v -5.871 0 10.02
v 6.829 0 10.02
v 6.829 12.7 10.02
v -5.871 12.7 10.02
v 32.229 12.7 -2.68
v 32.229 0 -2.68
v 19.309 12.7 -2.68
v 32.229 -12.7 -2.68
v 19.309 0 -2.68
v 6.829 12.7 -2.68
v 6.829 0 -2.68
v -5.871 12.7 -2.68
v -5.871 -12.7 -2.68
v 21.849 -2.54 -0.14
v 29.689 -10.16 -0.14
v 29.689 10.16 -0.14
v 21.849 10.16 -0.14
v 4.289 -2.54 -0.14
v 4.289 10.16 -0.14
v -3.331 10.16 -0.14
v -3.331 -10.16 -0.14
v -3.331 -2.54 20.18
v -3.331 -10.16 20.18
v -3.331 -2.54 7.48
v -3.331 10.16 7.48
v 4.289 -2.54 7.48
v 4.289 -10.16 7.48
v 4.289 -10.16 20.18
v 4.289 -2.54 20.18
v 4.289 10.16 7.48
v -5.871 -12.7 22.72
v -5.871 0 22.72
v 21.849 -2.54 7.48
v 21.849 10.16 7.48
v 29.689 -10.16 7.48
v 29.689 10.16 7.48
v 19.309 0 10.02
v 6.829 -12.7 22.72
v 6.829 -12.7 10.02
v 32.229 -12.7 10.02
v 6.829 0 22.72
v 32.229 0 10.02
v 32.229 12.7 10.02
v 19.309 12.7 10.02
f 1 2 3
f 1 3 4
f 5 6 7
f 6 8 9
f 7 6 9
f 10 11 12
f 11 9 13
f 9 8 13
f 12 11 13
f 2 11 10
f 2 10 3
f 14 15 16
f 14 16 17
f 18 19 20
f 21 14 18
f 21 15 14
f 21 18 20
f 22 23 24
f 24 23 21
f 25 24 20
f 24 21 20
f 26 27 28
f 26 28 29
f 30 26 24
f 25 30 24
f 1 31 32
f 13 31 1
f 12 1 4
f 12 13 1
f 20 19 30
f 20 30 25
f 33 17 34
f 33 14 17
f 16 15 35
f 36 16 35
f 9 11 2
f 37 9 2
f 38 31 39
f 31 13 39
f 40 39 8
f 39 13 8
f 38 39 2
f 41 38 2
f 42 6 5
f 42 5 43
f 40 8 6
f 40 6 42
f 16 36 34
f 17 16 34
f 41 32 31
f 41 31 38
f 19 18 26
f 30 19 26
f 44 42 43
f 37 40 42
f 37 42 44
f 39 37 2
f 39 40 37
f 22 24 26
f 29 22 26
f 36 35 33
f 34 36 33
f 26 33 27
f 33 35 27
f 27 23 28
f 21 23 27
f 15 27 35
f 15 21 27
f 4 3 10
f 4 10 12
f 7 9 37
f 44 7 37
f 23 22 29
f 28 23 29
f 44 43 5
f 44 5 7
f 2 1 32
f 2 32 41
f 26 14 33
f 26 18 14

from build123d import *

# Parameters (mm, degrees)
F0_W     = 12.7
F0_H     = 12.7
F1_DEPTH = 12.7
F2_DEPTH = 25.4
F3_W     = 12.9194361269
F3_H     = 12.7
F4_DEPTH = 12.7
F5_W     = 12.7
F5_H     = 12.7
F6_DEPTH = 12.7
F7_W     = 12.7
F7_H     = 12.7
F8_DEPTH = 12.7
F9_T     = -2.54


with BuildPart() as f1:
    # F0 (on Front) → F1 (new body)
    with BuildSketch(Plane.XZ):
        with Locations((0.4788246006, 3.6696097578)):
            Rectangle(F0_W, F0_H)
    extrude(amount=F1_DEPTH)

    # F2 (add): a face of the model
    f2_faces = [f1.faces().sort_by_distance(p)[0] for p in [
        (6.8288246006, -6.35, 3.6696097578),
    ]]
    extrude(f2_faces, amount=F2_DEPTH)

    # F3 (on face) → F4 (join)
    with BuildSketch(Plane(origin=(0, 0, 0), x_dir=(-1, 0, 0), z_dir=(0, 1, 0))):
        with Locations((-25.7691065371, 3.6696097578)):
            Rectangle(F3_W, F3_H)
    extrude(amount=F4_DEPTH)

    # F5 (on face) → F6 (join)
    with BuildSketch(Plane(origin=(0, 0, 0), x_dir=(-1, 0, 0), z_dir=(0, 1, 0))):
        with Locations((-0.4788246006, 3.6696097578)):
            Rectangle(F5_W, F5_H)
    extrude(amount=F6_DEPTH)

    # F7 (on face) → F8 (join)
    with BuildSketch(Plane.XY.offset(10.0196097578)):
        with Locations((0.4788246006, -6.35)):
            Rectangle(F7_W, F7_H)
    extrude(amount=F8_DEPTH)

    # F9 (hollow: no face is removed)
    offset(amount=F9_T, kind=Kind.INTERSECTION, mode=Mode.SUBTRACT)


solid = f1.part
